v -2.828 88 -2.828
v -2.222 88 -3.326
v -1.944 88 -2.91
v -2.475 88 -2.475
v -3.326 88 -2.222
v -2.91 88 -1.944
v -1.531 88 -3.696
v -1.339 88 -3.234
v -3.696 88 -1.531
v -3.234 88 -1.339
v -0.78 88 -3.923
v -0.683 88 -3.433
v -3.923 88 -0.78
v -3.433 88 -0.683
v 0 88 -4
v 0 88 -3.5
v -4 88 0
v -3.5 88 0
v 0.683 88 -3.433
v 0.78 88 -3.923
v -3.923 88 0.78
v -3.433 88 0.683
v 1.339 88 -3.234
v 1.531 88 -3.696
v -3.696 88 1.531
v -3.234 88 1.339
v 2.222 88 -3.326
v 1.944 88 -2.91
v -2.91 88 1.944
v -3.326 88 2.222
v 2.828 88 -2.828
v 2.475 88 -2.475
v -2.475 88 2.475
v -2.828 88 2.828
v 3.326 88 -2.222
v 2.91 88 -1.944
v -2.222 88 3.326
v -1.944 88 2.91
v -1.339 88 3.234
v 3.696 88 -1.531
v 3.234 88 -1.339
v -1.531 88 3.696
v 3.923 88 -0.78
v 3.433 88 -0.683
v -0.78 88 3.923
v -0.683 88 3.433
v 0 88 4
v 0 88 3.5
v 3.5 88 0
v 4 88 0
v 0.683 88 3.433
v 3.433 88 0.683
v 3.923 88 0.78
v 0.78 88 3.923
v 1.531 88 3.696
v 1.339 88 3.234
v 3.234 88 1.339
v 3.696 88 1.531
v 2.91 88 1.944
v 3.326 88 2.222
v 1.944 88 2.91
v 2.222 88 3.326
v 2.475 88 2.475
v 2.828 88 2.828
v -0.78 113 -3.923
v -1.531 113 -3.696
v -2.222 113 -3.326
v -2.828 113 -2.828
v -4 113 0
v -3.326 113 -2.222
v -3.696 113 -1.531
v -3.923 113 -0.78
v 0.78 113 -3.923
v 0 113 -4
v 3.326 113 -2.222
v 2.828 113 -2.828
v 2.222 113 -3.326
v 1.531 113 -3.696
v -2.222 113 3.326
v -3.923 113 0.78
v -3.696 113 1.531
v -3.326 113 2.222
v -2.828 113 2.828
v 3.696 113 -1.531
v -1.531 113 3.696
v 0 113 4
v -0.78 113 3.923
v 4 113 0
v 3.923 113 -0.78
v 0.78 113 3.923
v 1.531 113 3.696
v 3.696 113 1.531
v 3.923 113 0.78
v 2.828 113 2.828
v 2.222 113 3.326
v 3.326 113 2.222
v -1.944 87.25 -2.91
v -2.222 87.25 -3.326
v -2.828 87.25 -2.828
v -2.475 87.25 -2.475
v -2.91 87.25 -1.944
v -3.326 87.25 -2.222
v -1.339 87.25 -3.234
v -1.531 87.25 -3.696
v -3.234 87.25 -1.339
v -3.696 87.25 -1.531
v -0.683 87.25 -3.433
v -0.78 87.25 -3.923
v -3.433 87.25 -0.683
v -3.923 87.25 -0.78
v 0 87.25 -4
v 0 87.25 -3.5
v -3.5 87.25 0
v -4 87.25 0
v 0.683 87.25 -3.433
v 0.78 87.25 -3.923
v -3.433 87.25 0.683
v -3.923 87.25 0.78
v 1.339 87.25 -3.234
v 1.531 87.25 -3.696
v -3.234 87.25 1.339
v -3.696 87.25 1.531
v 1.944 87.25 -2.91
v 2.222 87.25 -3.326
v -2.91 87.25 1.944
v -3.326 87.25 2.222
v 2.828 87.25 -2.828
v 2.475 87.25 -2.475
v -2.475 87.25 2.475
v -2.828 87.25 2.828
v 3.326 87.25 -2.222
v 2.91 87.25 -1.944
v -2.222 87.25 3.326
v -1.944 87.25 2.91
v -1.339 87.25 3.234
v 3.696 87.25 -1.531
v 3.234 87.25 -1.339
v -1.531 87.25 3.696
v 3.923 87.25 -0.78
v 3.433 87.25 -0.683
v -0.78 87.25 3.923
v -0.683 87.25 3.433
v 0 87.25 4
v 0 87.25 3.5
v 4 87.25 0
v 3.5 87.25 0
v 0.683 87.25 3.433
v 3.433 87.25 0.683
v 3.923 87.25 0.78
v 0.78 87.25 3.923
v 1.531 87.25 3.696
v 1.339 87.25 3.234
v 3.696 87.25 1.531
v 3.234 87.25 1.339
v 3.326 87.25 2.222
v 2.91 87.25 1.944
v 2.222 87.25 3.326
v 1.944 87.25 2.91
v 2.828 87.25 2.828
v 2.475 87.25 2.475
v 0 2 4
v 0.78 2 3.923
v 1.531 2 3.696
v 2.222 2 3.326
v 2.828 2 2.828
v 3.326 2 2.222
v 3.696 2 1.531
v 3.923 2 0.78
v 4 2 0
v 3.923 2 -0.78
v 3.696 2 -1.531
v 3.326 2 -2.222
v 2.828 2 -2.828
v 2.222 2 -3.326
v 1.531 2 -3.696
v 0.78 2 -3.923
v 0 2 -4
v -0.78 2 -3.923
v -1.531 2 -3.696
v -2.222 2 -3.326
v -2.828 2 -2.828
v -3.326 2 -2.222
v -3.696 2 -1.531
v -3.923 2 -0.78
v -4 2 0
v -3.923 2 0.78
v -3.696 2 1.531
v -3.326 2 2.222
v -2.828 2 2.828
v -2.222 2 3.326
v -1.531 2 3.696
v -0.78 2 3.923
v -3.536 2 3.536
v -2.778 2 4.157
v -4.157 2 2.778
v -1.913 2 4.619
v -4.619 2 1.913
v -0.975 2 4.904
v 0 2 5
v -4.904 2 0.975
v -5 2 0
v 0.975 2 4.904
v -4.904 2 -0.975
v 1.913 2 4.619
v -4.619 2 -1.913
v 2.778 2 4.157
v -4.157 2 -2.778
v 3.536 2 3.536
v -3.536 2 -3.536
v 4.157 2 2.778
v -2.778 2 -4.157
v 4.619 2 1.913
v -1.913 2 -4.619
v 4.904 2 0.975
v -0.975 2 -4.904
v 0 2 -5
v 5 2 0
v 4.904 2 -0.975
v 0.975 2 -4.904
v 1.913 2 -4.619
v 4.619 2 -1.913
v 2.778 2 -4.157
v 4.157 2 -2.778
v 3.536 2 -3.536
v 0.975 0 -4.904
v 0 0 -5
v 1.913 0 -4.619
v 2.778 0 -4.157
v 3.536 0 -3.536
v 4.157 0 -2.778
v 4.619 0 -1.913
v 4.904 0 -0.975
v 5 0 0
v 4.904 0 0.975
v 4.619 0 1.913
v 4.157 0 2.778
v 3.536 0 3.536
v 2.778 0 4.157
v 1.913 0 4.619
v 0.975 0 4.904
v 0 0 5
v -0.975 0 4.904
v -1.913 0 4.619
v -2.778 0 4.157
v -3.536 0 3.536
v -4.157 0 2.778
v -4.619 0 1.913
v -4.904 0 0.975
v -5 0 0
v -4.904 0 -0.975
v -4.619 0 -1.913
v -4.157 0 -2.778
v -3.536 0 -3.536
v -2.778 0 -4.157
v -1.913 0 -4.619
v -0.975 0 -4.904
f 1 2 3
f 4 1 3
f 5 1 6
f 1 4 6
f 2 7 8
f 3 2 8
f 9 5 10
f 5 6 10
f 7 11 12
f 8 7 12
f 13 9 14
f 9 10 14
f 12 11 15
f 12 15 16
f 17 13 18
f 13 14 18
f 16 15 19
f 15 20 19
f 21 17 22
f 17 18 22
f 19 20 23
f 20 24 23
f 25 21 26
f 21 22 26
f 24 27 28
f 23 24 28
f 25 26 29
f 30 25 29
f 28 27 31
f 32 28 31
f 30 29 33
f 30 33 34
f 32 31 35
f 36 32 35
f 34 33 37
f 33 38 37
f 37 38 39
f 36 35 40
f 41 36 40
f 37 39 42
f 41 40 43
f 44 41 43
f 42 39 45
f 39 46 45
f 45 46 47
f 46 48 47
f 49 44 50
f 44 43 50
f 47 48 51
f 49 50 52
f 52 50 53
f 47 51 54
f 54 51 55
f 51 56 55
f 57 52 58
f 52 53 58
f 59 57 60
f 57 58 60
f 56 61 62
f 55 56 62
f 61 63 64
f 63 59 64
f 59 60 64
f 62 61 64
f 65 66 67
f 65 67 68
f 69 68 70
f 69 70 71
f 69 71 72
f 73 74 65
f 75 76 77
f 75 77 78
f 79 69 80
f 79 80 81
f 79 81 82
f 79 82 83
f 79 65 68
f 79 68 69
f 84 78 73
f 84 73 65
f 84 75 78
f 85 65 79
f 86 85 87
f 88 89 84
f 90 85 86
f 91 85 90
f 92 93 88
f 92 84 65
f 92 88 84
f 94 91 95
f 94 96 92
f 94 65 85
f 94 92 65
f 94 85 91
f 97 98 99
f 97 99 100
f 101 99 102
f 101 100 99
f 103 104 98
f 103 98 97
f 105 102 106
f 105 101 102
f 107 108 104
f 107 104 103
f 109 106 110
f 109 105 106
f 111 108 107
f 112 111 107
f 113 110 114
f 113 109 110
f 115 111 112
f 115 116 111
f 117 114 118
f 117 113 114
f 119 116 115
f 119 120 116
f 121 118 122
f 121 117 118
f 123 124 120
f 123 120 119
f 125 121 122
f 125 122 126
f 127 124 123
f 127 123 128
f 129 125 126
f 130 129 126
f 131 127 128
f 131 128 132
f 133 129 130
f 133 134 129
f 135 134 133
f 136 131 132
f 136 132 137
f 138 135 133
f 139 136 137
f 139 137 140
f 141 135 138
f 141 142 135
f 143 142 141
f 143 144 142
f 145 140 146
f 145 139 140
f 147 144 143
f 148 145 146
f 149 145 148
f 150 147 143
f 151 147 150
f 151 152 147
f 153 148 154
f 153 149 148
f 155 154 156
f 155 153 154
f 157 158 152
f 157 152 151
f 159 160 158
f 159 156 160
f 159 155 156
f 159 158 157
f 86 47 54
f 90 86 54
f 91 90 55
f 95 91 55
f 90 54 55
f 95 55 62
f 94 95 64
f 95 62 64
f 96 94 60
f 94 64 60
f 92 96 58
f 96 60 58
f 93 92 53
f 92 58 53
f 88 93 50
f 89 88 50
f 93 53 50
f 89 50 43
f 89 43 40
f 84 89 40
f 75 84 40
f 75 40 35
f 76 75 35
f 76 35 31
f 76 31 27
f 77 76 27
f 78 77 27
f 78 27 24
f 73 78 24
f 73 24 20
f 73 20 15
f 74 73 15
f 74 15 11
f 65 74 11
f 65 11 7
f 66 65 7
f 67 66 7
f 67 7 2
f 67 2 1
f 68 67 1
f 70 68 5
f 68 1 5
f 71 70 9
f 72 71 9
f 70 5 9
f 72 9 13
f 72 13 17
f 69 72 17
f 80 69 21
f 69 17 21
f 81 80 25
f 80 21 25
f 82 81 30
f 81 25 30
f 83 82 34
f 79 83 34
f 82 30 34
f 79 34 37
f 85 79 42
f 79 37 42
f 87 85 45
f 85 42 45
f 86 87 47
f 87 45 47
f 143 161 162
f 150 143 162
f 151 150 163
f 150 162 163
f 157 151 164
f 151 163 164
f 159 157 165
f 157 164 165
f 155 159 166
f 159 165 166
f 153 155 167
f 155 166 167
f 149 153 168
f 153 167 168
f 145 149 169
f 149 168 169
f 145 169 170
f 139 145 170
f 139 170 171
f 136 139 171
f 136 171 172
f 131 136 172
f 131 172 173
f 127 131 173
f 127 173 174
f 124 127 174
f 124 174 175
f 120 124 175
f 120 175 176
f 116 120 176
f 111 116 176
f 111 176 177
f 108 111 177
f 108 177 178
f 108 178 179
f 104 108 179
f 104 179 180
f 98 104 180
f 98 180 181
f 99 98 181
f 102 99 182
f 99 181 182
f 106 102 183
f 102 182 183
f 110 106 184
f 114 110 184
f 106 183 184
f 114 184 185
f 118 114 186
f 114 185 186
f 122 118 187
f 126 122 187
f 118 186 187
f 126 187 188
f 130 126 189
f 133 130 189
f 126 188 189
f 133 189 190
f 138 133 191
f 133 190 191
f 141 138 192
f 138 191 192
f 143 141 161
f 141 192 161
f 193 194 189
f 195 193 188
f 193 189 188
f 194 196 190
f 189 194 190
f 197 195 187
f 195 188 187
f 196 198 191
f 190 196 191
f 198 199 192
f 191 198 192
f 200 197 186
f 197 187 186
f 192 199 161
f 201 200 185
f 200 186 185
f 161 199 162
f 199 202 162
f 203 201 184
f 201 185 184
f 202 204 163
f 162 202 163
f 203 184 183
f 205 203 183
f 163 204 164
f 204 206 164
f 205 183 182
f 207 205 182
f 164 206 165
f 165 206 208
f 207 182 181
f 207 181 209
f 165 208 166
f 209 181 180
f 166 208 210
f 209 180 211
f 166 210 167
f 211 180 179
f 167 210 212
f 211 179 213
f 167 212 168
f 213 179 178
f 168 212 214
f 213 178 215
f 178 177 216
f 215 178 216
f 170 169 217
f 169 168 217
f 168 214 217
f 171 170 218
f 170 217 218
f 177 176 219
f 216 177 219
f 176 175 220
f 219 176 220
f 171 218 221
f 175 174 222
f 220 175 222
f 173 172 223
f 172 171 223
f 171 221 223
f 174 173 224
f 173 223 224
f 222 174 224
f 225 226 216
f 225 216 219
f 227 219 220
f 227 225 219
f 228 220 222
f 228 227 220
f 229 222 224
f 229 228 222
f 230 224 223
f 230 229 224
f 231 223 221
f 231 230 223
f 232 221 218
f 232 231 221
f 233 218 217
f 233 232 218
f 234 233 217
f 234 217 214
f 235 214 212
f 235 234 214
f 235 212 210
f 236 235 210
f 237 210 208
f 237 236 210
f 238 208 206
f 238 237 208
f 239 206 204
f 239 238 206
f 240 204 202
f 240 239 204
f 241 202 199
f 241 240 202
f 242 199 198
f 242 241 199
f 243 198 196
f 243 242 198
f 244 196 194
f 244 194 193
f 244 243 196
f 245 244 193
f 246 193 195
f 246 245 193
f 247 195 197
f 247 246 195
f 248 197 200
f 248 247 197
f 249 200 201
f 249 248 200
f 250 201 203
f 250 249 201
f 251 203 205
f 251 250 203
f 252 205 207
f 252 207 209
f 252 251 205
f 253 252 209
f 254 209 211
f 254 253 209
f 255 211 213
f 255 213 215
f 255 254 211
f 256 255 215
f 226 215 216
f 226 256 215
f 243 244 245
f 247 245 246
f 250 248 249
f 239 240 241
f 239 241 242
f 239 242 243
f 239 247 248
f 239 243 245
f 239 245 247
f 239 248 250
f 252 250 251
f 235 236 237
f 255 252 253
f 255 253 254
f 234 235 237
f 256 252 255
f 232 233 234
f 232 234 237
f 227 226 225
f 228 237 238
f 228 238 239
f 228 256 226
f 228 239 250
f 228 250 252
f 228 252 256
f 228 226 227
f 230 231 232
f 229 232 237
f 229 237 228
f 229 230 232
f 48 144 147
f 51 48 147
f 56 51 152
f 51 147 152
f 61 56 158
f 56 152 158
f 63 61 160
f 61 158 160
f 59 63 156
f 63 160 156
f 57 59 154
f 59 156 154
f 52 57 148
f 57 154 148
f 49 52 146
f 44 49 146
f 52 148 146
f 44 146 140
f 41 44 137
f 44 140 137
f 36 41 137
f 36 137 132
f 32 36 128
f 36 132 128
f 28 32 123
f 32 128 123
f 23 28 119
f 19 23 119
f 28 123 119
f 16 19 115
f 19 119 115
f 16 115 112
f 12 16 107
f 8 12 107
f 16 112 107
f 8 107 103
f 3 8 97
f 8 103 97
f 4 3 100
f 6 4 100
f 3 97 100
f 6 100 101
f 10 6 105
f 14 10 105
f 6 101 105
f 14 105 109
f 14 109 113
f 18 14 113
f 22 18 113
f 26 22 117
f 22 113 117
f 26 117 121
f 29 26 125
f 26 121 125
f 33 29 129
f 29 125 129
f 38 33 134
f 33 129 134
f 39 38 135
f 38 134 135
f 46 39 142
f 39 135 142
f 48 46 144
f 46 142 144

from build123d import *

# Parameters (mm, degrees)
SKETCH1_R           = 4
BOSS_EXTRUDE1_DEPTH = 113
CUT_EXTRUDE1_START  = -0.75
SKETCH2_R           = 4
SKETCH2_R_2         = 3.5
CUT_EXTRUDE1_DEPTH  = 0.75
SKETCH3_R           = 5
BOSS_EXTRUDE2_DEPTH = 2


with BuildPart() as part:
    # Sketch1 → Boss-Extrude1 (new body)
    with BuildSketch(Plane(origin=(0, 0, 0), x_dir=(1, 0, 0), z_dir=(0, 1, 0))):
        with Locations(Location((0, 0, 0), (0, 0, 270))):
            Circle(SKETCH1_R)
    extrude(amount=BOSS_EXTRUDE1_DEPTH)

    # Sketch2 → Cut-Extrude1 (cut)
    with BuildSketch(Plane(origin=(0, 88, 0), x_dir=(1, 0, 0), z_dir=(0, 1, 0)).offset(CUT_EXTRUDE1_START)):
        with Locations(Location((0, 0, 0), (0, 0, 270))):
            Circle(SKETCH2_R)
        with Locations(Location((0, 0, 0), (0, 0, 270))):
            Circle(SKETCH2_R_2, mode=Mode.SUBTRACT)
    extrude(amount=CUT_EXTRUDE1_DEPTH, mode=Mode.SUBTRACT)

    # Sketch3 → Boss-Extrude2 (add)
    with BuildSketch(Plane(origin=(0, 0, 0), x_dir=(-1, 0, 0), z_dir=(0, -1, 0))):
        with Locations(Location((0, 0, 0), (0, 0, 90))):
            Circle(SKETCH3_R)
    extrude(amount=-BOSS_EXTRUDE2_DEPTH)


solid = part.part
